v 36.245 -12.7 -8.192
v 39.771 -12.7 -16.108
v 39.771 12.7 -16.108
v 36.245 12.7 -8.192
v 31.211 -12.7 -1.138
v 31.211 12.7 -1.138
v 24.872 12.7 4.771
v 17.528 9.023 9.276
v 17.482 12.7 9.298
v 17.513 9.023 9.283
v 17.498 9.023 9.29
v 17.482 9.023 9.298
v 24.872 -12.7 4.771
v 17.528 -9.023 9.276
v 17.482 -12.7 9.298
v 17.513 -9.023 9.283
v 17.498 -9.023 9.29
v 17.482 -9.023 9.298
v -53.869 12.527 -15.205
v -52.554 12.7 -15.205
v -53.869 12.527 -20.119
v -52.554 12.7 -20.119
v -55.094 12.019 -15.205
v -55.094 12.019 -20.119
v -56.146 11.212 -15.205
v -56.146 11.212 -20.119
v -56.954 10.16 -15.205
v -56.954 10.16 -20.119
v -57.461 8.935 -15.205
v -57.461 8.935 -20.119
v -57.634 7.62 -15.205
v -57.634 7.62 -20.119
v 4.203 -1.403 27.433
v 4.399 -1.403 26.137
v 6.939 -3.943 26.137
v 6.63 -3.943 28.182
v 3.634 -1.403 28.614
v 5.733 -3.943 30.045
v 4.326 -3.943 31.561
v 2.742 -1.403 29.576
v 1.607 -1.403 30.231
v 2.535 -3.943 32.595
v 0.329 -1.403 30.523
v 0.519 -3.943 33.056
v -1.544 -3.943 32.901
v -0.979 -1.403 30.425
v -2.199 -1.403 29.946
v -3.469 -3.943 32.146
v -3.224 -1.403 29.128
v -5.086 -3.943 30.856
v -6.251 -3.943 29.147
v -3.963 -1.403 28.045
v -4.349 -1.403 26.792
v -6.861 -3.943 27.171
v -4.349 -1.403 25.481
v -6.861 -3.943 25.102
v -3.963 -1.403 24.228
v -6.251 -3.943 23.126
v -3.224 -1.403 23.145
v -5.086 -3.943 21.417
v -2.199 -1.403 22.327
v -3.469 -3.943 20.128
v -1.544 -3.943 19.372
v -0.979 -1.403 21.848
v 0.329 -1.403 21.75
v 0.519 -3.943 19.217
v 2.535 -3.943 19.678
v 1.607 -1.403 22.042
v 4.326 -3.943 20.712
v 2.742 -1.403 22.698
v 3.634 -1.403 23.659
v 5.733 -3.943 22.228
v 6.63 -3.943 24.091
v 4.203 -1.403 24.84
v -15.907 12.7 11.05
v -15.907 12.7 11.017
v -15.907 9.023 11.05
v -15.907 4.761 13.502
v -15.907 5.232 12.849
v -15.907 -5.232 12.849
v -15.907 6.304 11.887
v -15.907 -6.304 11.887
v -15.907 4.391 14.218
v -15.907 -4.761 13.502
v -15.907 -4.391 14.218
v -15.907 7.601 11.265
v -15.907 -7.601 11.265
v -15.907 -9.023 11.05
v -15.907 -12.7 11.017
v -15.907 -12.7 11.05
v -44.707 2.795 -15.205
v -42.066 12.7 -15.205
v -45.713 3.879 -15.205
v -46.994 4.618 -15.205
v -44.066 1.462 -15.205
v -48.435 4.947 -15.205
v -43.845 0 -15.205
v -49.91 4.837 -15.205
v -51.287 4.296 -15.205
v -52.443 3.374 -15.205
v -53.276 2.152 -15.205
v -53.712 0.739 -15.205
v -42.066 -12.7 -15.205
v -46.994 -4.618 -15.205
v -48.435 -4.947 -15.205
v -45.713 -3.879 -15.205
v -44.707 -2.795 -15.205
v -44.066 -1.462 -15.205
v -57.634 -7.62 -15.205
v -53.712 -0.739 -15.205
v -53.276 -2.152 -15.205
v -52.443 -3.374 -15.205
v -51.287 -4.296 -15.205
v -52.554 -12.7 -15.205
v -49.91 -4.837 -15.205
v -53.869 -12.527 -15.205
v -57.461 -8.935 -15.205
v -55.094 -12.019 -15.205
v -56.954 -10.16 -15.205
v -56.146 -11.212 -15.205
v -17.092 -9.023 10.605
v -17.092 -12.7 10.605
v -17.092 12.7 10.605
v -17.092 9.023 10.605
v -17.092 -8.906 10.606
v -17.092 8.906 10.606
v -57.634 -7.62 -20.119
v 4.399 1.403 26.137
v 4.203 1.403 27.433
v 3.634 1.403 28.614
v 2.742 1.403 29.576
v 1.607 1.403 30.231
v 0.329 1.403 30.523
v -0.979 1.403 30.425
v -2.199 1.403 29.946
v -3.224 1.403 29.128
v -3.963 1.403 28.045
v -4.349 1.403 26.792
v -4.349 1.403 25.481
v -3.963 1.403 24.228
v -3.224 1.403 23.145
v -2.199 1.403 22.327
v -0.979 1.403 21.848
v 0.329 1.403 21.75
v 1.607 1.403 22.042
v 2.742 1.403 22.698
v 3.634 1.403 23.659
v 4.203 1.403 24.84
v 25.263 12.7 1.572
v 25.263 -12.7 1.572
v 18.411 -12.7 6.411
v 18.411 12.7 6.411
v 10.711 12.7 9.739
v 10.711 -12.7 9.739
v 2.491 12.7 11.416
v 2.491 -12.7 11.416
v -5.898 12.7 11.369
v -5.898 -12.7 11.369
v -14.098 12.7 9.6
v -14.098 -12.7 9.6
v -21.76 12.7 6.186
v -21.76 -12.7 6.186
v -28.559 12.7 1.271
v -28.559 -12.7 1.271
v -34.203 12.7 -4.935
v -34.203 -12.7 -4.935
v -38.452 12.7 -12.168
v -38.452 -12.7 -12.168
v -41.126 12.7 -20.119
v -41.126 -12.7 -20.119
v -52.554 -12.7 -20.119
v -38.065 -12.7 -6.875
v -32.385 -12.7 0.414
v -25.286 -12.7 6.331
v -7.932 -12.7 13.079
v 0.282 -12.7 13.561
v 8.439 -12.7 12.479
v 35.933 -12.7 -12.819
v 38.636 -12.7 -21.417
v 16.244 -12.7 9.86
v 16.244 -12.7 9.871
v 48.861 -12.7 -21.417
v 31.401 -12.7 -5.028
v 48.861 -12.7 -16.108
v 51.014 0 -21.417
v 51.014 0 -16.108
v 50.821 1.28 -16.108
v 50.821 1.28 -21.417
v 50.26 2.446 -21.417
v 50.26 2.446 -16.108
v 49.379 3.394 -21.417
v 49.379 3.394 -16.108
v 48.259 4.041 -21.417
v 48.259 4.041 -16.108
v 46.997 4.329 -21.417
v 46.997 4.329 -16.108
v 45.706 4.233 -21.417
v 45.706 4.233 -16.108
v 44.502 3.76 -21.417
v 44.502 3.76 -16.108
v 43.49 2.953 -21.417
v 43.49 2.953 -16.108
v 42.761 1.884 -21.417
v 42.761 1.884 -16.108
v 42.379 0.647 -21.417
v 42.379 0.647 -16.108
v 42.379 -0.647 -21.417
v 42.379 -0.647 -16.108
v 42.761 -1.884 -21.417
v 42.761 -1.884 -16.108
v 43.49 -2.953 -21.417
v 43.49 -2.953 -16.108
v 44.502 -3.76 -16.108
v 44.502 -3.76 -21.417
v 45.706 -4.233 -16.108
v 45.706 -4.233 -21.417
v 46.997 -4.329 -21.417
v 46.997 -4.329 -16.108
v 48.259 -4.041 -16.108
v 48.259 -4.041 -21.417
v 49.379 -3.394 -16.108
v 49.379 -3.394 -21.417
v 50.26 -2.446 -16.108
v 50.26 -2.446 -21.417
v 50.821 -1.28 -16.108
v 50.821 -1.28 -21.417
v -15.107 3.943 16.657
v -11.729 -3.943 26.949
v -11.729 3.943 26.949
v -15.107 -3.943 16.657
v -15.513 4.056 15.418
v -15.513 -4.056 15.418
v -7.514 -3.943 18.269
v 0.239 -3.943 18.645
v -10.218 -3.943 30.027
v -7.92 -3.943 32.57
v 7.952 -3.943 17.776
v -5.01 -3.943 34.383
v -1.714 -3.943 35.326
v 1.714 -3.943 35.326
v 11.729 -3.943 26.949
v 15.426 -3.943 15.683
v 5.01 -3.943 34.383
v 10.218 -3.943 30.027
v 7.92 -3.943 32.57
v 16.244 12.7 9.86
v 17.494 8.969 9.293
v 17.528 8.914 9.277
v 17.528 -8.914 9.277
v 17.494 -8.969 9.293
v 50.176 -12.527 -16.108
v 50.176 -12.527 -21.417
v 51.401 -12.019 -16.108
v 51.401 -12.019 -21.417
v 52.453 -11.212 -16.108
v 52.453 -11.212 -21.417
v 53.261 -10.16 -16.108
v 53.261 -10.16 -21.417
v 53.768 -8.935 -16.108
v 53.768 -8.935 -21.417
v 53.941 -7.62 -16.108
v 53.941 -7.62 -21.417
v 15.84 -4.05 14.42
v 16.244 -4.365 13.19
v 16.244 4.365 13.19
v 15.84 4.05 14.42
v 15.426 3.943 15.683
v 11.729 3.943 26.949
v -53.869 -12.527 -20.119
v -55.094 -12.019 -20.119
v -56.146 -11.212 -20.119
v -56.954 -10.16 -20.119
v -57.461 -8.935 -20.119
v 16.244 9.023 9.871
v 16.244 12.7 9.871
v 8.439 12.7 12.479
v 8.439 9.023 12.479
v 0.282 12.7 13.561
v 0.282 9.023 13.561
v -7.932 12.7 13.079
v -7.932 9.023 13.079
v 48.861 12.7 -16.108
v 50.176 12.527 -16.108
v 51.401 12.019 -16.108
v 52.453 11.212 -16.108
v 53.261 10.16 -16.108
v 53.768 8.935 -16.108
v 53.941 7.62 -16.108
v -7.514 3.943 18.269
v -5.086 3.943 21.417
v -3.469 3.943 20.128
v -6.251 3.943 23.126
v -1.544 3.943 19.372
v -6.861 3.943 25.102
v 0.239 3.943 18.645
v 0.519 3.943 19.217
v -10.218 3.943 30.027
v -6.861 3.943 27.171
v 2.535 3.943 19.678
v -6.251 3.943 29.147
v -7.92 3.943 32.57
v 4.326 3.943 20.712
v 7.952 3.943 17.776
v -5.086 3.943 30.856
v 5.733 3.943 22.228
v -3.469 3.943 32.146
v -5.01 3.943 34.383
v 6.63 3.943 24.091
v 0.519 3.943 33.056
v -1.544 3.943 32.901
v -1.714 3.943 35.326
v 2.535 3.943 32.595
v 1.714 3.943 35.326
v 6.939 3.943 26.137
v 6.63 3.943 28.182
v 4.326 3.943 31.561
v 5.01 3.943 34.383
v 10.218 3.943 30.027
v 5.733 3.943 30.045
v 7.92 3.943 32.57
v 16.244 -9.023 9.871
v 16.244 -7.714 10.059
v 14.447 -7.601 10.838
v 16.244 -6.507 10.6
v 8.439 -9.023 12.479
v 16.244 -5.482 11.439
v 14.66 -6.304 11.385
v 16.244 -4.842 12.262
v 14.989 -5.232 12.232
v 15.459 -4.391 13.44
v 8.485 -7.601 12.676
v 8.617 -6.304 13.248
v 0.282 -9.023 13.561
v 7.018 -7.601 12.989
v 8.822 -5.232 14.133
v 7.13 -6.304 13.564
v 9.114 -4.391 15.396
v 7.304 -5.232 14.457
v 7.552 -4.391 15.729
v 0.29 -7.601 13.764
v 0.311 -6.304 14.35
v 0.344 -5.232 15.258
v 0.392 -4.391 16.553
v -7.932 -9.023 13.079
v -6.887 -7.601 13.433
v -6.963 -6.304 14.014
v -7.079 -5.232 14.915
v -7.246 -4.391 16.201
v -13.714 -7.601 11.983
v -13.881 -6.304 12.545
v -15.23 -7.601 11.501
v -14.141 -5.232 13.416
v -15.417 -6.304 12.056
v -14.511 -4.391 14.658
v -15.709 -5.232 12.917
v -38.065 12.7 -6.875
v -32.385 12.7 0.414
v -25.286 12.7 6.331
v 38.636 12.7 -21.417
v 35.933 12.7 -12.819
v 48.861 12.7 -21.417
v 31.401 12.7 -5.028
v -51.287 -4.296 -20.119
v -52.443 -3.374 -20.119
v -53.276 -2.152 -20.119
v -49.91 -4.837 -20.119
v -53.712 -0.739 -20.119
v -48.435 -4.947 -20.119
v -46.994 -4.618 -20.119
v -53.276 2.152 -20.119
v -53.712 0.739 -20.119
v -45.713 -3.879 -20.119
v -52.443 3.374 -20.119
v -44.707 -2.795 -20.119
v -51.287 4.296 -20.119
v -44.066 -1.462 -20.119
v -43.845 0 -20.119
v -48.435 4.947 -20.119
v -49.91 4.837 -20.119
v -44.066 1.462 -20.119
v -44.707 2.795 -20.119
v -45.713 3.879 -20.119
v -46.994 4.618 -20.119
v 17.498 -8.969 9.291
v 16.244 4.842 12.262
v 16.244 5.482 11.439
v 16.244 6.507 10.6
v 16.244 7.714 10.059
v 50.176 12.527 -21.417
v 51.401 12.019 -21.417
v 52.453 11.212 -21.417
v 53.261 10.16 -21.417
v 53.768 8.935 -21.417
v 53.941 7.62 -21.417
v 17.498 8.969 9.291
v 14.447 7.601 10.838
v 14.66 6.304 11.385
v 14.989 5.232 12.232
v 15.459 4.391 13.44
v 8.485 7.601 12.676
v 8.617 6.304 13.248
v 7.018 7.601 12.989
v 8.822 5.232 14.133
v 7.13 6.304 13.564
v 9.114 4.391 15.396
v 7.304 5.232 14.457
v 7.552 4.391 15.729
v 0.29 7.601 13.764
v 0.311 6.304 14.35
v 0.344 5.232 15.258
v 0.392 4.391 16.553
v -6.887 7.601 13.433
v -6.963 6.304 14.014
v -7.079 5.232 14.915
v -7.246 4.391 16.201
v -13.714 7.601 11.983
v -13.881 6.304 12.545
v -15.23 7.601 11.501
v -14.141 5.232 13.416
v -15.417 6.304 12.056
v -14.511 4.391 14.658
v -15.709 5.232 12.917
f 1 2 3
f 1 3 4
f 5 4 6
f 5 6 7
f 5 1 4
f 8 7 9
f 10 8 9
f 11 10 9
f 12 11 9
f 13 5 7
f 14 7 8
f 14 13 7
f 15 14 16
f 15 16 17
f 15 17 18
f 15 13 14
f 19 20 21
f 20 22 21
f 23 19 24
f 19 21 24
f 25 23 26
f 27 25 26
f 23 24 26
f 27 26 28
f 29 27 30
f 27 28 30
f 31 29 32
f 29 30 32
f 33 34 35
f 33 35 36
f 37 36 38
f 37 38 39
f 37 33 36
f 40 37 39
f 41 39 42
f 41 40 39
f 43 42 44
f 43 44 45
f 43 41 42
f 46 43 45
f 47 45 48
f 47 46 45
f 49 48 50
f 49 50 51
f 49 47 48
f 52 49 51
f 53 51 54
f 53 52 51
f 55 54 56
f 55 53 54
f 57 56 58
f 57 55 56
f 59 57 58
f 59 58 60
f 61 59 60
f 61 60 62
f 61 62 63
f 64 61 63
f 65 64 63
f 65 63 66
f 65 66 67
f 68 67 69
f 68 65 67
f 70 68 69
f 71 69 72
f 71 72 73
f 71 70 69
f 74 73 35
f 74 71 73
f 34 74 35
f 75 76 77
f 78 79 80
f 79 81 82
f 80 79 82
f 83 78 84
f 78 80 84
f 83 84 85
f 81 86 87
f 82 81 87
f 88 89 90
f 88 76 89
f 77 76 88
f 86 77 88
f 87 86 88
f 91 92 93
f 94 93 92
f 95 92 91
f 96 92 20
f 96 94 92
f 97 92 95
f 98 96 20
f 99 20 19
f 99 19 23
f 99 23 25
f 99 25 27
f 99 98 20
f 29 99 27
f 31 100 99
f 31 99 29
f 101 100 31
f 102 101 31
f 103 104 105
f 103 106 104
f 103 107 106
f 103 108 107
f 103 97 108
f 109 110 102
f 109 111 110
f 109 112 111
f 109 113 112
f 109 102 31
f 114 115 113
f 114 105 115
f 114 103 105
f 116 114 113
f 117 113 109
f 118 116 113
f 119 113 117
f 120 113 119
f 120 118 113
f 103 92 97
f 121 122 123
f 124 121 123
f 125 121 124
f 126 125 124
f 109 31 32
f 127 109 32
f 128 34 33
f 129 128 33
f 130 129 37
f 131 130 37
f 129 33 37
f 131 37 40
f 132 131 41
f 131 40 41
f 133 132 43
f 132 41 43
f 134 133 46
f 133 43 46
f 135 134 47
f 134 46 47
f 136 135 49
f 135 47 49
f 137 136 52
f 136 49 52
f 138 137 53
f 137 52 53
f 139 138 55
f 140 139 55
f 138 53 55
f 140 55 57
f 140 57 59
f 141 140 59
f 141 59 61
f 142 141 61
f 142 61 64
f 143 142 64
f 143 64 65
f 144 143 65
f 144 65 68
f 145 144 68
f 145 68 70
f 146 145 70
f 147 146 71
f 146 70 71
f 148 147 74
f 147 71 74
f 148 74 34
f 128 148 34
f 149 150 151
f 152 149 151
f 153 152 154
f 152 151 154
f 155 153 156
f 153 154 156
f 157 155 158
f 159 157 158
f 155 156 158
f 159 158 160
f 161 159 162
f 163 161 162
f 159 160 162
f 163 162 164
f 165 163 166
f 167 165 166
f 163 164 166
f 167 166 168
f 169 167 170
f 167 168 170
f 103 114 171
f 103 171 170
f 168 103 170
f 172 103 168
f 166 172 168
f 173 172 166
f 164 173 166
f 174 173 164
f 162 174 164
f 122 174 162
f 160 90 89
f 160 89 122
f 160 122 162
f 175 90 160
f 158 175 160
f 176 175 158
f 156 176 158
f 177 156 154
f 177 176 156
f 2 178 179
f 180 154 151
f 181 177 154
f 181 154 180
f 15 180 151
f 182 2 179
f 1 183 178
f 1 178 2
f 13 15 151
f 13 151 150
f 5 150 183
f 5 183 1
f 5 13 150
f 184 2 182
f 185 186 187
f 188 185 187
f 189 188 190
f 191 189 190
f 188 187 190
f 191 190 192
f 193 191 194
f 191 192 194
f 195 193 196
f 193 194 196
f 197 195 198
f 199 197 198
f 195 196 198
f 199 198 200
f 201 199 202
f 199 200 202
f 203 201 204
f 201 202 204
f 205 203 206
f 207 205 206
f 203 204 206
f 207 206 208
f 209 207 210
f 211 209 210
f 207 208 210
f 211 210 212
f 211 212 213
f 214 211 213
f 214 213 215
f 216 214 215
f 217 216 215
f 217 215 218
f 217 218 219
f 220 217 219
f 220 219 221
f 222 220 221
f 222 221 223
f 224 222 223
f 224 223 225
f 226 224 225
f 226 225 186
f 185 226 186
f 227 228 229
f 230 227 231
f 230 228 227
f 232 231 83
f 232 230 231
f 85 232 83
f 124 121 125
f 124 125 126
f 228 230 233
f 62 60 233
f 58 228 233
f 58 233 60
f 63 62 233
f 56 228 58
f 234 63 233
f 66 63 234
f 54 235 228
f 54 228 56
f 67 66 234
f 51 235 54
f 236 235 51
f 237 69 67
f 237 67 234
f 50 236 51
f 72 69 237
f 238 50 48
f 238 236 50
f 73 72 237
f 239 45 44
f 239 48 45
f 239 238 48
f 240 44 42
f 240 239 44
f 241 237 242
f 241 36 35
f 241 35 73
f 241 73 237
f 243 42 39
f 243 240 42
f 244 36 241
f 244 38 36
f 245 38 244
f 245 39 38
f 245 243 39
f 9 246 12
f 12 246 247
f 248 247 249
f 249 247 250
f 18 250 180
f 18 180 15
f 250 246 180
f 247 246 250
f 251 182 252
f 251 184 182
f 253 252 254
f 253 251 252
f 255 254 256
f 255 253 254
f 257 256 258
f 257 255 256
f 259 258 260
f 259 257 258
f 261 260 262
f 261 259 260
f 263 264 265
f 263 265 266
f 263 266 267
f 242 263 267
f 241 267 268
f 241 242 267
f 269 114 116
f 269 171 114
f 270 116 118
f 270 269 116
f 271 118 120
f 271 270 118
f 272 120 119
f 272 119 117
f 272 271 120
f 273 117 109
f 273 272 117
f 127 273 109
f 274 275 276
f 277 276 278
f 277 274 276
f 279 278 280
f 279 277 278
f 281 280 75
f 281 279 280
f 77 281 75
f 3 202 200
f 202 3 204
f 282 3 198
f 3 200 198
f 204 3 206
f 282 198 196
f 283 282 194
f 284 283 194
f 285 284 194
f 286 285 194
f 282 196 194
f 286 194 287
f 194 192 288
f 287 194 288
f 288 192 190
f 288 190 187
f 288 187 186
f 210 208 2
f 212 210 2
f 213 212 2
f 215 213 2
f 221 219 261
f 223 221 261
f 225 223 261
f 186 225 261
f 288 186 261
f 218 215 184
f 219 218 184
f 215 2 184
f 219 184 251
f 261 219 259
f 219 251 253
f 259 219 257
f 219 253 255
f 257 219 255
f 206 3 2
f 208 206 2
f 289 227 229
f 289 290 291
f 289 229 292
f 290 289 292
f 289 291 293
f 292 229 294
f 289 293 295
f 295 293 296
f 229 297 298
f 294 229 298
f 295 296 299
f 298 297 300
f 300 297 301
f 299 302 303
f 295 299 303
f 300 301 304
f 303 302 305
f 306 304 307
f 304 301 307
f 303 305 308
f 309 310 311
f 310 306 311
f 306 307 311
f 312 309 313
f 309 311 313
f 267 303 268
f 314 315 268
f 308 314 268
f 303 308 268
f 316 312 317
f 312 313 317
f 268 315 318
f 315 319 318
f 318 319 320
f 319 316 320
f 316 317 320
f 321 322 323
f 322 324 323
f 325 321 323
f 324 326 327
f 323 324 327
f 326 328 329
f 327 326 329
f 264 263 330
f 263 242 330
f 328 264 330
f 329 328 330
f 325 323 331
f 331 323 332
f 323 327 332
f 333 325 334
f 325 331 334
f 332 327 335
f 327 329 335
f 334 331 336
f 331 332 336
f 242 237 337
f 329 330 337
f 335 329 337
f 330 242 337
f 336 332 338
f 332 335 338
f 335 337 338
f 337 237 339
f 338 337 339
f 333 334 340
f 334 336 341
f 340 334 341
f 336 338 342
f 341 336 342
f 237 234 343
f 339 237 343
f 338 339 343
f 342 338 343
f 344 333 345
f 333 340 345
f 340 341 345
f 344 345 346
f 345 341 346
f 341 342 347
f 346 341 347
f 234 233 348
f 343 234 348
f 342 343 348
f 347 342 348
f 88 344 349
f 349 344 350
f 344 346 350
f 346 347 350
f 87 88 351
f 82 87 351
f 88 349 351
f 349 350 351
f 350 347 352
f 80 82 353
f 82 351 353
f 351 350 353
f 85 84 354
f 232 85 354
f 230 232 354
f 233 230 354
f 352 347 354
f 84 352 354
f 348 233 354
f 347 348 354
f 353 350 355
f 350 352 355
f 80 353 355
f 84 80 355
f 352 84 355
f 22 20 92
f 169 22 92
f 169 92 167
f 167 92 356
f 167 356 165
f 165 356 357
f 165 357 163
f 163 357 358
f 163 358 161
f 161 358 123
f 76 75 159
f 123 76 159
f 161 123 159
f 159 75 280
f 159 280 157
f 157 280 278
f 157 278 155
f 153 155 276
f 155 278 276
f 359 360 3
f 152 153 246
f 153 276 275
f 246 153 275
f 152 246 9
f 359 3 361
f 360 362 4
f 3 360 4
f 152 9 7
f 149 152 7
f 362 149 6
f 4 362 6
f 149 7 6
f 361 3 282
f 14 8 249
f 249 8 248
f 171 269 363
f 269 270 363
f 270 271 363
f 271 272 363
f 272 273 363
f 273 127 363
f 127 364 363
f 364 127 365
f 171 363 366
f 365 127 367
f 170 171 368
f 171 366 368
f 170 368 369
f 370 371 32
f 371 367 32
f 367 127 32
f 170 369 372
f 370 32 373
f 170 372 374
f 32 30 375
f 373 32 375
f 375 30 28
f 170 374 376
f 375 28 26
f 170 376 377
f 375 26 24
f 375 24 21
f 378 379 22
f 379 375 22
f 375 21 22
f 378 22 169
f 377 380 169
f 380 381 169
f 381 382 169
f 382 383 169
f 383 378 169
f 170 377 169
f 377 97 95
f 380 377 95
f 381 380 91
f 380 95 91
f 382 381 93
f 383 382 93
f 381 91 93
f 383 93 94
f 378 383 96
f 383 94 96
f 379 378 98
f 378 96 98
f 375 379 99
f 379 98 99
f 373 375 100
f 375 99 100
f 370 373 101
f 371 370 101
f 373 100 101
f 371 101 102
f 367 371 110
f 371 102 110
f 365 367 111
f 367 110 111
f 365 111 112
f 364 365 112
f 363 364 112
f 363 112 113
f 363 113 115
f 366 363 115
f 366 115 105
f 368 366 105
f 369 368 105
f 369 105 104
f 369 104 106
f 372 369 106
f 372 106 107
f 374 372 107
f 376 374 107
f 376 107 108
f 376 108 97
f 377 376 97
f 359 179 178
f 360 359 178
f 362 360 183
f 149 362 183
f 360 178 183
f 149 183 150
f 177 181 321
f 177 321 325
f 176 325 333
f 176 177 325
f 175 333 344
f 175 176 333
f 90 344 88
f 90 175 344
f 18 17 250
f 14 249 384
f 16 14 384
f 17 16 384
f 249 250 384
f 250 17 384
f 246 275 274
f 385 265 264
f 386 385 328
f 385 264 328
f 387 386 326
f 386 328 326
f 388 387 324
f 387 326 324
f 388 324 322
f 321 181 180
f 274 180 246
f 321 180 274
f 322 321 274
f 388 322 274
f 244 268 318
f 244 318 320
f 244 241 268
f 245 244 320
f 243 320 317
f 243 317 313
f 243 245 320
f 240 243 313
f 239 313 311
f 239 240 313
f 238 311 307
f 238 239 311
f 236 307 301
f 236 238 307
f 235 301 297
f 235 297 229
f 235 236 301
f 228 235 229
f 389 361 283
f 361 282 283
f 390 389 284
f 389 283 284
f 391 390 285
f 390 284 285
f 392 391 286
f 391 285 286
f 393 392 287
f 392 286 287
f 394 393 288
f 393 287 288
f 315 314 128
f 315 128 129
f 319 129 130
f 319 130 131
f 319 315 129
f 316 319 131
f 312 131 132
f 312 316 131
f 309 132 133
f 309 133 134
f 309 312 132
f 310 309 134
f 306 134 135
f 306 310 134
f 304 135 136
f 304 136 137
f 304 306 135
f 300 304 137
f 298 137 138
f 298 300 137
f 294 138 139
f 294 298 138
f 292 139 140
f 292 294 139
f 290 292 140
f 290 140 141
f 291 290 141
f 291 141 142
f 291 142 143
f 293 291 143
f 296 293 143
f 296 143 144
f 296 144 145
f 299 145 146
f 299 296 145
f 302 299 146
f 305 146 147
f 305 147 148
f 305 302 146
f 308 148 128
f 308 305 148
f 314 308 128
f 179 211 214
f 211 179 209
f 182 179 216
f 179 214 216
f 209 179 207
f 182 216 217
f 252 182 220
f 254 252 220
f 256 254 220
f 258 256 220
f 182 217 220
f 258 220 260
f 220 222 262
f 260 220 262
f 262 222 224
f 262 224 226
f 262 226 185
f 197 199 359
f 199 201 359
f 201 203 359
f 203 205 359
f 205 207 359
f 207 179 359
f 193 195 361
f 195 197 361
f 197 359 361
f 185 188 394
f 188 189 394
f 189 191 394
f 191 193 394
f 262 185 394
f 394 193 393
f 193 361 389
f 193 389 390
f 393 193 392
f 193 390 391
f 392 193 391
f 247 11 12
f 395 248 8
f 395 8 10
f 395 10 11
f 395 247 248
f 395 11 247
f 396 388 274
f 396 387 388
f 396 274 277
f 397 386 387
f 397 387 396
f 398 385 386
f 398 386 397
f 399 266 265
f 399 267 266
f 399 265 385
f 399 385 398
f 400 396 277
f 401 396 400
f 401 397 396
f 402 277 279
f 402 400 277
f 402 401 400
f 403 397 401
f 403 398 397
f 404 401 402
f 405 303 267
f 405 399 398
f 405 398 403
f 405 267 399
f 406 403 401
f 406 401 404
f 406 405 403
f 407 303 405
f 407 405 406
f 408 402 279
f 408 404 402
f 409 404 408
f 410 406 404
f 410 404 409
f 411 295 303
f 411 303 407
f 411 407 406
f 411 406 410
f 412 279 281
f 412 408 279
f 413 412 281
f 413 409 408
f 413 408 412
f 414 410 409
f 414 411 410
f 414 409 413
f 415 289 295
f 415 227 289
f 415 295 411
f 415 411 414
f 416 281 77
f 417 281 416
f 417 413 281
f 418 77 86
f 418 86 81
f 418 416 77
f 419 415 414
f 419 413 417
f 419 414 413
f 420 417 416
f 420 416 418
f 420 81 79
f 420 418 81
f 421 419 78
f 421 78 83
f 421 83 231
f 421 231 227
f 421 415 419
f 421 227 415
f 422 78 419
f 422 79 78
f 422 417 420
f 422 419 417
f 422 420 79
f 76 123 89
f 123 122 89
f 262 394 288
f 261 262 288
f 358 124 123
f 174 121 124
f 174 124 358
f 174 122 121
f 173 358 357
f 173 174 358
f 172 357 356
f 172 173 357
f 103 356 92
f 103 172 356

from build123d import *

# Parameters (mm, degrees)
F1_DEPTH  = 3.943235
F3_DEPTH  = 12.7
F4_R      = 5.08
F6_DEPTH  = 12.7
F7_W      = 17.78
F7_H      = 5.3086
F8_DEPTH  = 12.7
F9_DEPTH  = 8.66714
F10_DEPTH = 9.47498
F12_DEPTH = 12.7
F13_DEPTH = 12.7
F14_R     = 4.3985303862
F15_DEPTH = 53.72973
F16_SIZE  = 2.54
F17_SIZE  = 2.54
F18_R     = 5.08
F19_R     = 4.960906564
F19_R_2   = 4.3415616657
F20_DEPTH = 23.4886
F22_DEPTH = 18.208115
F24_DEPTH = 12.7
F26_DEPTH = 20.13737


with BuildPart() as f1:
    # F0 (on Front) → F1 (new body, symmetric)
    with BuildSketch(Plane.XZ):
        with BuildLine():
            Line((-11.7292143404, 26.9492678344), (-17.5938215107, 9.0761780739))
            ThreePointArc((-17.5938215107, 9.0761780739), (0, 11.6662775846), (17.5938215107, 9.0761780739))
            Line((17.5938215107, 9.0761780739), (11.7292143404, 26.9492678344))
            ThreePointArc((11.7292143404, 26.9492678344), (0, 35.4451148535), (-11.7292143404, 26.9492678344))
        make_face()
    extrude(amount=F1_DEPTH, both=True)

    # F2 (on Front) → F3 (join, symmetric)
    with BuildSketch(Plane.XZ):
        with BuildLine():
            Line((36.3047122955, -16.6163872927), (39.93518278, -16.6163872927))
            ThreePointArc((39.93518278, -16.6163872927), (-0.7137528874, 13.5858944169), (-42.1693213284, -15.4993189499))
            Line((-42.1693213284, -15.4993189499), (-39.0973836184, -15.7785862684))
            ThreePointArc((-39.0973836184, -15.7785862684), (-1.101821027, 10.3088316272), (36.3047122955, -16.6163872927))
        make_face()
    extrude(amount=F3_DEPTH, both=True)

    # F4
    f4_edges = [f1.edges().sort_by_distance(p)[0] for p in [
        (0.356921, -3.943235, 13.558065),
        (0.356921, 3.943235, 13.558065),
    ]]
    fillet(f4_edges, radius=F4_R)

    # F5 (on Front) → F6 (join, symmetric)
    with BuildSketch(Plane.XZ):
        Polygon((-39.8543514311, -20.1193168759), (-39.659883827, -15.2054578066), (-57.6343514311, -15.2054578066), (-57.6343514311, -20.1193168759), align=None)
    extrude(amount=F6_DEPTH, both=True)

    # F7 (on Front) → F8 (join, symmetric)
    with BuildSketch(Plane.XZ):
        with Locations((45.0512229579, -18.7627813943)):
            Rectangle(F7_W, F7_H)
    extrude(amount=F8_DEPTH, both=True)

    # F5 (on Front) → F9 (join)
    with BuildSketch(Plane.XZ):
        Polygon((-39.8543514311, -20.1193168759), (-39.659883827, -15.2054578066), (-57.6343514311, -15.2054578066), (-57.6343514311, -20.1193168759), align=None)
    extrude(amount=F9_DEPTH)

    # F7 (on Front) → F10 (join)
    with BuildSketch(Plane.XZ):
        with Locations((45.0512229579, -18.7627813943)):
            Rectangle(F7_W, F7_H)
    extrude(amount=F10_DEPTH)

    # F11 (on Front) → F12 (cut, symmetric)
    with BuildSketch(Plane.XZ):
        with BuildLine():
            ThreePointArc((-40.8051013947, -20.0025010854), (-1.7400987678, -54.2430909447), (38.6715009809, -21.6027013958))
            ThreePointArc((38.6715009809, -21.6027013958), (-0.4185114947, 11.3957328504), (-40.8051013947, -20.0025010854))
        make_face()
    extrude(amount=F12_DEPTH, both=True, mode=Mode.SUBTRACT)

    # F11 (on Front) → F13 (cut, symmetric)
    with BuildSketch(Plane.XZ):
        with BuildLine():
            ThreePointArc((-40.8051013947, -20.0025010854), (-1.7400987678, -54.2430909447), (38.6715009809, -21.6027013958))
            ThreePointArc((38.6715009809, -21.6027013958), (-0.4185114947, 11.3957328504), (-40.8051013947, -20.0025010854))
        make_face()
    extrude(amount=F13_DEPTH, both=True, mode=Mode.SUBTRACT)

    # F14 (on face) → F15 (cut, symmetric)
    with BuildSketch(Plane.XZ.offset(3.943235)):
        with Locations((0, 26.1365994811)):
            Circle(F14_R)
    extrude(amount=F15_DEPTH, both=True, mode=Mode.SUBTRACT)

    # F16
    f16_edges = [f1.edges().sort_by_distance(p)[0] for p in [
        (-4.39853, -3.943235, 26.136599),
    ]]
    chamfer(f16_edges, length=F16_SIZE)

    # F17
    f17_edges = [f1.edges().sort_by_distance(p)[0] for p in [
        (-4.39853, 3.943235, 26.136599),
    ]]
    chamfer(f17_edges, length=F17_SIZE)

    # F18
    f18_edges = [f1.edges().sort_by_distance(p)[0] for p in [
        (53.941223, 12.7, -18.762781),
        (53.941223, -12.7, -18.762781),
        (-57.634351, 12.7, -17.662387),
        (-57.634351, -12.7, -17.662387),
    ]]
    fillet(f18_edges, radius=F18_R)

    # F19 (on face) → F20 (cut)
    with BuildSketch(Plane.XY.offset(-15.2054578066)):
        with Locations((-48.8061010838, 0)):
            Circle(F19_R)
        with Locations((46.67250067, 0)):
            Circle(F19_R_2)
    extrude(amount=-F20_DEPTH, mode=Mode.SUBTRACT)

    # F21 (on Front) → F22 (cut, symmetric)
    with BuildSketch(Plane.XZ):
        with BuildLine():
            Line((-41.792165488, -23.9205155522), (39.0426814556, -25.9368028492))
            ThreePointArc((39.0426814556, -25.9368028492), (-0.4636625416, 11.5973705937), (-41.792165488, -23.9205155522))
        make_face()
    extrude(amount=F22_DEPTH, both=True, mode=Mode.SUBTRACT)

    # F23 (on Front) → F24 (cut, symmetric)
    with BuildSketch(Plane.XZ):
        Polygon((-17.0922335237, 10.6045696884), (-15.9068014473, 11.0168391839), (-15.9068014473, 14.8834753782), align=None)
    extrude(amount=F24_DEPTH, both=True, mode=Mode.SUBTRACT)

    # F25 (on Front) → F26 (cut, symmetric)
    with BuildSketch(Plane.XZ):
        Polygon((17.5980012864, 9.2452950776), (16.2439439446, 13.5627323762), (16.2439439446, 9.859982878), align=None)
    extrude(amount=F26_DEPTH, both=True, mode=Mode.SUBTRACT)


solid = f1.part
